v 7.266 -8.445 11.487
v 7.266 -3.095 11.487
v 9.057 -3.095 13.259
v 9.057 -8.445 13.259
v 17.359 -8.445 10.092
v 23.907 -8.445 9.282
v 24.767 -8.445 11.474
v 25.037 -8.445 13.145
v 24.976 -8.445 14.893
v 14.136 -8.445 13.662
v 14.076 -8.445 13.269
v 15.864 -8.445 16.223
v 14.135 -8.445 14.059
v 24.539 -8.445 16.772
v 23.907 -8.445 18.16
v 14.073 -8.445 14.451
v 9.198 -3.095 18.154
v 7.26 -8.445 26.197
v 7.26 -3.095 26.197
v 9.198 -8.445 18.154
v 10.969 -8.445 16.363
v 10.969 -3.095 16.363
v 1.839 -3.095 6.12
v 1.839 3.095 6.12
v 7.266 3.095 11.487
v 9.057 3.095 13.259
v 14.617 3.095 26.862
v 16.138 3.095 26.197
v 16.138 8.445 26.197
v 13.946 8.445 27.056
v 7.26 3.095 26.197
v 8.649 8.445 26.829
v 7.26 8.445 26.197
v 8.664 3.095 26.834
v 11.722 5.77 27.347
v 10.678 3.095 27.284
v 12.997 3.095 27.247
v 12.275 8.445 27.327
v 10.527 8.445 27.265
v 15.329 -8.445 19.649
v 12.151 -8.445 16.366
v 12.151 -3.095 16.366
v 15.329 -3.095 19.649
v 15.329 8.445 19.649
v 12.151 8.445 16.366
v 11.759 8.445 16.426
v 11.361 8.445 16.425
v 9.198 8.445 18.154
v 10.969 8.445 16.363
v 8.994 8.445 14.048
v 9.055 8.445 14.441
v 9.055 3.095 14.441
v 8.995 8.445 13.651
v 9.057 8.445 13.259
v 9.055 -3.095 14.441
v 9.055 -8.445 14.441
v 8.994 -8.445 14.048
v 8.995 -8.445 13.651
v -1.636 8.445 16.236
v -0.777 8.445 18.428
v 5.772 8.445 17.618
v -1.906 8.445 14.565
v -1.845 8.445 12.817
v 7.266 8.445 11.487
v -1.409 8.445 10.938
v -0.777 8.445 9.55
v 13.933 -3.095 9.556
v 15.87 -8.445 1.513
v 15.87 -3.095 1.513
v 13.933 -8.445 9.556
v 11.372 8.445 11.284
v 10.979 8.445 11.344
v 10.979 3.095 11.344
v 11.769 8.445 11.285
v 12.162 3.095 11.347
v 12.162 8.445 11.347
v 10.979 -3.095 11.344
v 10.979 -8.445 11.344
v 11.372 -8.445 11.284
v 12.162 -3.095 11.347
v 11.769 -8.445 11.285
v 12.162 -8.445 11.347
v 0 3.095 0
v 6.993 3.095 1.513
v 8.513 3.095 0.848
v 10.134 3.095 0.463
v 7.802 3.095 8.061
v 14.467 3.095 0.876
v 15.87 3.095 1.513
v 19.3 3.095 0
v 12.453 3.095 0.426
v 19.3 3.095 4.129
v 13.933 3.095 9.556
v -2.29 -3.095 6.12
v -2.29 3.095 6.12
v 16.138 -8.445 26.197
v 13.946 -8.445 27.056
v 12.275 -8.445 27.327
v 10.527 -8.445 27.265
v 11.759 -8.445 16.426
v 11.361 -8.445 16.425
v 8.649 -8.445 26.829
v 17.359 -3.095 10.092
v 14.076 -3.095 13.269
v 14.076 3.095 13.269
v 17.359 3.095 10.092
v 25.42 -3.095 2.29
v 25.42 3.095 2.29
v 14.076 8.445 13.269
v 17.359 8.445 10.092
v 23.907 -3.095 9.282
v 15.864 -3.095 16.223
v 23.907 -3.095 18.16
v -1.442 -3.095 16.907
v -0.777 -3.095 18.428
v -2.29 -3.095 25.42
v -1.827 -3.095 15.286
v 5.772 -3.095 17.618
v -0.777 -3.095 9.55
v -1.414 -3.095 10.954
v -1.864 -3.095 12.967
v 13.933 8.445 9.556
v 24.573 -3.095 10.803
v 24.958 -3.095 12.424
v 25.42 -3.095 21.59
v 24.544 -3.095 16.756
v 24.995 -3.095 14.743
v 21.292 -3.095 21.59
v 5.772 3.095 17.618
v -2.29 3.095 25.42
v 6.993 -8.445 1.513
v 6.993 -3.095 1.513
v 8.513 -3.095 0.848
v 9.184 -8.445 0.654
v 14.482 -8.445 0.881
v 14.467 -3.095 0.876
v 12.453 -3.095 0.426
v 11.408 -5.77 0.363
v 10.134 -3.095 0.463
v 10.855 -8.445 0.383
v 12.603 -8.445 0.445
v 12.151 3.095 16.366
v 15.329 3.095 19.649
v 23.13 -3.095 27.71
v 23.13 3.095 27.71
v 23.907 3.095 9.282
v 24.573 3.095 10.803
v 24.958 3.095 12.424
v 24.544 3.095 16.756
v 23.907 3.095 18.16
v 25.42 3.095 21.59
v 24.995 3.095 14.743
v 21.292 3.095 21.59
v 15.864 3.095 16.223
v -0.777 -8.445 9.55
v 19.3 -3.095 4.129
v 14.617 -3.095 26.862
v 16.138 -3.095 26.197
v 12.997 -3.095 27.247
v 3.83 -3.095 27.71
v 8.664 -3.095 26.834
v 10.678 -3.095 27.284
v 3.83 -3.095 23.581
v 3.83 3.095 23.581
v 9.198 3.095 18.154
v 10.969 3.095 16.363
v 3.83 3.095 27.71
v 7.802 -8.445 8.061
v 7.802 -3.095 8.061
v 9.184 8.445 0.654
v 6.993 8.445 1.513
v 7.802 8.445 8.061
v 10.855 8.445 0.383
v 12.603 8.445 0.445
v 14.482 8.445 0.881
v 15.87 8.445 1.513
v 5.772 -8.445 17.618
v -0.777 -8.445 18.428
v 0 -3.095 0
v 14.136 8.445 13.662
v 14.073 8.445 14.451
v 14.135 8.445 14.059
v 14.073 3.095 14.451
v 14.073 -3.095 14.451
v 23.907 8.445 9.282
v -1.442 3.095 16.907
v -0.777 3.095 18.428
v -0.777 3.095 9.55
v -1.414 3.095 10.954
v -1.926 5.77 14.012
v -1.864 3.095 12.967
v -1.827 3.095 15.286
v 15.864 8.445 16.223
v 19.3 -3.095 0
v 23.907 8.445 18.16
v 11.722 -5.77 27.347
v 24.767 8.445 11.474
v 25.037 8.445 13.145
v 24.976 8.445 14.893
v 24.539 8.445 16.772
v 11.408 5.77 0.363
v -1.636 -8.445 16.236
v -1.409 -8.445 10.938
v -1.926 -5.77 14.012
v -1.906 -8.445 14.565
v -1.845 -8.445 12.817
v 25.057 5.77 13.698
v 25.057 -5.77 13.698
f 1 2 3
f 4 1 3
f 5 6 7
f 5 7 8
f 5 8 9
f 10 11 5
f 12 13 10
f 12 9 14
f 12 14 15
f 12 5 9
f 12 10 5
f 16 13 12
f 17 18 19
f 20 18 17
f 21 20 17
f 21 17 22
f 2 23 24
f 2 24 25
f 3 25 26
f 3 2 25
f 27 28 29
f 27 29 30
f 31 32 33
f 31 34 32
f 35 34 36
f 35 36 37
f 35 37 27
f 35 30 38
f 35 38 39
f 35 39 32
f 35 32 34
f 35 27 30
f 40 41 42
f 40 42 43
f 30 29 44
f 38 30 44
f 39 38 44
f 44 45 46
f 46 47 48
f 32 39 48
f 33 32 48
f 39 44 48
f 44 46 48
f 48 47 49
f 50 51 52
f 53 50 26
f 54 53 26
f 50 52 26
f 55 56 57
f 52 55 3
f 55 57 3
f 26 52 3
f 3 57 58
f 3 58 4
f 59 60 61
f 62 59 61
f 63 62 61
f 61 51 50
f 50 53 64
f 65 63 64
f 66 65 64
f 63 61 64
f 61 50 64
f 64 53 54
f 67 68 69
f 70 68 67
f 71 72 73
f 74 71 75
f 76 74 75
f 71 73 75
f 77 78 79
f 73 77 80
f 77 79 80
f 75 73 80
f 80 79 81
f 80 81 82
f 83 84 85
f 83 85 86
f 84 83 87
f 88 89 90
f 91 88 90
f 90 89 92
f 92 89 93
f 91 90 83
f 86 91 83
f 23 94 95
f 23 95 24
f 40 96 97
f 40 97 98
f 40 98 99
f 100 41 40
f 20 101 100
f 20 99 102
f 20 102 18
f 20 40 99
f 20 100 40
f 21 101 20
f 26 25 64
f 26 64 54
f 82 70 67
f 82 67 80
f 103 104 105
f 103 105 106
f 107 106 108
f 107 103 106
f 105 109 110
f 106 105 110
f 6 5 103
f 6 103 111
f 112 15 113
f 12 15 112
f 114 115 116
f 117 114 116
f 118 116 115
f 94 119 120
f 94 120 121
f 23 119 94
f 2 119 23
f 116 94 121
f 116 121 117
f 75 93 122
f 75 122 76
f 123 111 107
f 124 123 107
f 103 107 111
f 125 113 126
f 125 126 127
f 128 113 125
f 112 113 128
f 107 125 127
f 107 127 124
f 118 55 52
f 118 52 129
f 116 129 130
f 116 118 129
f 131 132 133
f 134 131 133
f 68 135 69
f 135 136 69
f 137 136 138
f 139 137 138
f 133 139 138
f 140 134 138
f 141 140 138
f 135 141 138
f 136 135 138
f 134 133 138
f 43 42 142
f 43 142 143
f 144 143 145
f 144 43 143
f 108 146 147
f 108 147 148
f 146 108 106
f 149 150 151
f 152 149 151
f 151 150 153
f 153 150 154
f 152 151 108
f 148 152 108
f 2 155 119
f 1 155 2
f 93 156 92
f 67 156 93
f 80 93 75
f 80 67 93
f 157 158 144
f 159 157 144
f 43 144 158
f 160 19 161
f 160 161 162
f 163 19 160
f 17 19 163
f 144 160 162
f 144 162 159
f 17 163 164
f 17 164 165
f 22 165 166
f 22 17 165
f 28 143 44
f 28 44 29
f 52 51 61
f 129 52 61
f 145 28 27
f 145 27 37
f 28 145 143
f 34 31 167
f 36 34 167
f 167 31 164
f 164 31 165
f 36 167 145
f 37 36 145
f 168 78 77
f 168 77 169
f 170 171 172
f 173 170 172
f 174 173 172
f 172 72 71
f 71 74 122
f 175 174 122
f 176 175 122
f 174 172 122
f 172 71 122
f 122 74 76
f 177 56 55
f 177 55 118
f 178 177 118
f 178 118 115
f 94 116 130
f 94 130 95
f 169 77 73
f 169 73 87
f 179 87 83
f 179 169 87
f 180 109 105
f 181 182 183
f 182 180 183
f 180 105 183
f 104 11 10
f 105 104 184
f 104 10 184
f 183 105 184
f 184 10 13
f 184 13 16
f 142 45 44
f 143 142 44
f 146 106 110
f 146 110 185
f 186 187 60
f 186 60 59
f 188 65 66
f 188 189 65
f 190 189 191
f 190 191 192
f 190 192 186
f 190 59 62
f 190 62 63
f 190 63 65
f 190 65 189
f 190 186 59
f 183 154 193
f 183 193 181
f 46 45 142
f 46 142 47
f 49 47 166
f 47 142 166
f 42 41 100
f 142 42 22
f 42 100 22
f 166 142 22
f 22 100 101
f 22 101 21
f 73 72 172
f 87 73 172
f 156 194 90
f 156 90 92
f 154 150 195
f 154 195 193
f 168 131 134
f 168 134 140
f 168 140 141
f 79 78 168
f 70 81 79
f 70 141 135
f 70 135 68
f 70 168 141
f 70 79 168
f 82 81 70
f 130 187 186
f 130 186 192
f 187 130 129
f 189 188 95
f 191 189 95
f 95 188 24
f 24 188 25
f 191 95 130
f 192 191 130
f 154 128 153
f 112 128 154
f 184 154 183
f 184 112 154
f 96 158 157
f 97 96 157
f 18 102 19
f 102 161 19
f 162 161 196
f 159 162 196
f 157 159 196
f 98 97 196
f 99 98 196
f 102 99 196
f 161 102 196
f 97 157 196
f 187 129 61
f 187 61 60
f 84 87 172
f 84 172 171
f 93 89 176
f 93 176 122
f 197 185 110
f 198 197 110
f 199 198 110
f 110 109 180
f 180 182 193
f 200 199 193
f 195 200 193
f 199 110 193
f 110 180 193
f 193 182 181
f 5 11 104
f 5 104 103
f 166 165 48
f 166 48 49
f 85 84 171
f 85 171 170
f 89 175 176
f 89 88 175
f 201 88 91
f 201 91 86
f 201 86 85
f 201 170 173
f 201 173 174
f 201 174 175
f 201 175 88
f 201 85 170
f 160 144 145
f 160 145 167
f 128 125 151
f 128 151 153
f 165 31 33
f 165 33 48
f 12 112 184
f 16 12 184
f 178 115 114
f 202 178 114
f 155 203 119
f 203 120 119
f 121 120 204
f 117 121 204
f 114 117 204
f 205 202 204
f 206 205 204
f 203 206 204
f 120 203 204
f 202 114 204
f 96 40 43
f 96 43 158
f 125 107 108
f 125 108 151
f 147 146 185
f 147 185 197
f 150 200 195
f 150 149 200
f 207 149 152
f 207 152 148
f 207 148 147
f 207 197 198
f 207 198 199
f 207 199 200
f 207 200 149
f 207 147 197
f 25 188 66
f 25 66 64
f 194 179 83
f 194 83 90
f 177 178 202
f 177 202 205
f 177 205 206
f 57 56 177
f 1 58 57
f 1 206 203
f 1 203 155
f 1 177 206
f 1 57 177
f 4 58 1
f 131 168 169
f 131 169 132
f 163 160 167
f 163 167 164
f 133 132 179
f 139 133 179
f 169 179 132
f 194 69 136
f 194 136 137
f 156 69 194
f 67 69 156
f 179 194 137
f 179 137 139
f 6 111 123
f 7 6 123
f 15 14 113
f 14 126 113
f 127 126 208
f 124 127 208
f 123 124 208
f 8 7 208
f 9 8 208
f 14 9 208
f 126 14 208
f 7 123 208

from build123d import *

# Parameters (mm, degrees)
F1_DEPTH      = 3.095
F3_DEPTH      = 8.445
F7_COUNT      = 4
F8_R          = 2.5781
F9_DEPTH      = 8.4460001
F9_DEPTH_BACK = 8.4460001


with BuildPart() as f1:
    # F0 (on Front) → F1 (new body, symmetric)
    with BuildSketch(Plane.XZ):
        Polygon((11.5652237332, 11.95), (0, 0), (19.3, 0), (19.3, 4.1286678818), align=None)
    extrude(amount=F1_DEPTH, both=True)

    # F2 (on Front) → F3 (join, symmetric)
    with BuildSketch(Plane.XZ):
        with BuildLine():
            Line((13.932926336, 9.555801671), (11.5652237332, 11.95))
            Line((11.5652237332, 11.95), (7.8017793698, 8.0613454283))
            Line((7.8017793698, 8.0613454283), (6.9926385768, 1.5128084924))
            add(Edge.make_bspline(
                [(6.9926385768, 1.5128084924), (7.9436427917, 0.9535204283), (11.3715528422, -0.2218124125), (14.9808283626, 0.9440175404), (15.870211611, 1.5128084924)],
                knots=[0, 0, 0, 0, 0.4987797835, 1, 1, 1, 1], degree=3))
            Line((15.870211611, 1.5128084924), (13.932926336, 9.555801671))
        make_face()
    extrude(amount=F3_DEPTH, both=True)


with BuildPart() as f7_1:
    # F7: instance of F1
    add(f1.part.rotate(Axis((11.5652237332, 0, 13.855), (0, -1, 0)), 1 * 360 / F7_COUNT))


with BuildPart() as f7_2:
    # F7: instance of F1
    add(f1.part.rotate(Axis((11.5652237332, 0, 13.855), (0, -1, 0)), 2 * 360 / F7_COUNT))


with BuildPart() as f7_3:
    # F7: instance of F1
    add(f1.part.rotate(Axis((11.5652237332, 0, 13.855), (0, -1, 0)), 3 * 360 / F7_COUNT))


with BuildPart() as f9_tool:
    # F8 (on Front) → F9 (new body, two sides)
    with BuildSketch(Plane.XZ) as f9_sk:
        with Locations((11.5652237332, 13.855)):
            Circle(F8_R)
    extrude(amount=-F9_DEPTH)
    extrude(f9_sk.sketch, amount=F9_DEPTH_BACK)


with BuildPart() as f1_1:
    add(f1.part)

    # F9: cut by f9_tool
    add(f9_tool.part, mode=Mode.SUBTRACT)


with BuildPart() as f7_1_1:
    add(f7_1.part)

    # F9: cut by f9_tool
    add(f9_tool.part, mode=Mode.SUBTRACT)


with BuildPart() as f7_2_1:
    add(f7_2.part)

    # F9: cut by f9_tool
    add(f9_tool.part, mode=Mode.SUBTRACT)


with BuildPart() as f7_3_1:
    add(f7_3.part)

    # F9: cut by f9_tool
    add(f9_tool.part, mode=Mode.SUBTRACT)


solid = Compound([f1_1.part, f7_1_1.part, f7_2_1.part, f7_3_1.part])
